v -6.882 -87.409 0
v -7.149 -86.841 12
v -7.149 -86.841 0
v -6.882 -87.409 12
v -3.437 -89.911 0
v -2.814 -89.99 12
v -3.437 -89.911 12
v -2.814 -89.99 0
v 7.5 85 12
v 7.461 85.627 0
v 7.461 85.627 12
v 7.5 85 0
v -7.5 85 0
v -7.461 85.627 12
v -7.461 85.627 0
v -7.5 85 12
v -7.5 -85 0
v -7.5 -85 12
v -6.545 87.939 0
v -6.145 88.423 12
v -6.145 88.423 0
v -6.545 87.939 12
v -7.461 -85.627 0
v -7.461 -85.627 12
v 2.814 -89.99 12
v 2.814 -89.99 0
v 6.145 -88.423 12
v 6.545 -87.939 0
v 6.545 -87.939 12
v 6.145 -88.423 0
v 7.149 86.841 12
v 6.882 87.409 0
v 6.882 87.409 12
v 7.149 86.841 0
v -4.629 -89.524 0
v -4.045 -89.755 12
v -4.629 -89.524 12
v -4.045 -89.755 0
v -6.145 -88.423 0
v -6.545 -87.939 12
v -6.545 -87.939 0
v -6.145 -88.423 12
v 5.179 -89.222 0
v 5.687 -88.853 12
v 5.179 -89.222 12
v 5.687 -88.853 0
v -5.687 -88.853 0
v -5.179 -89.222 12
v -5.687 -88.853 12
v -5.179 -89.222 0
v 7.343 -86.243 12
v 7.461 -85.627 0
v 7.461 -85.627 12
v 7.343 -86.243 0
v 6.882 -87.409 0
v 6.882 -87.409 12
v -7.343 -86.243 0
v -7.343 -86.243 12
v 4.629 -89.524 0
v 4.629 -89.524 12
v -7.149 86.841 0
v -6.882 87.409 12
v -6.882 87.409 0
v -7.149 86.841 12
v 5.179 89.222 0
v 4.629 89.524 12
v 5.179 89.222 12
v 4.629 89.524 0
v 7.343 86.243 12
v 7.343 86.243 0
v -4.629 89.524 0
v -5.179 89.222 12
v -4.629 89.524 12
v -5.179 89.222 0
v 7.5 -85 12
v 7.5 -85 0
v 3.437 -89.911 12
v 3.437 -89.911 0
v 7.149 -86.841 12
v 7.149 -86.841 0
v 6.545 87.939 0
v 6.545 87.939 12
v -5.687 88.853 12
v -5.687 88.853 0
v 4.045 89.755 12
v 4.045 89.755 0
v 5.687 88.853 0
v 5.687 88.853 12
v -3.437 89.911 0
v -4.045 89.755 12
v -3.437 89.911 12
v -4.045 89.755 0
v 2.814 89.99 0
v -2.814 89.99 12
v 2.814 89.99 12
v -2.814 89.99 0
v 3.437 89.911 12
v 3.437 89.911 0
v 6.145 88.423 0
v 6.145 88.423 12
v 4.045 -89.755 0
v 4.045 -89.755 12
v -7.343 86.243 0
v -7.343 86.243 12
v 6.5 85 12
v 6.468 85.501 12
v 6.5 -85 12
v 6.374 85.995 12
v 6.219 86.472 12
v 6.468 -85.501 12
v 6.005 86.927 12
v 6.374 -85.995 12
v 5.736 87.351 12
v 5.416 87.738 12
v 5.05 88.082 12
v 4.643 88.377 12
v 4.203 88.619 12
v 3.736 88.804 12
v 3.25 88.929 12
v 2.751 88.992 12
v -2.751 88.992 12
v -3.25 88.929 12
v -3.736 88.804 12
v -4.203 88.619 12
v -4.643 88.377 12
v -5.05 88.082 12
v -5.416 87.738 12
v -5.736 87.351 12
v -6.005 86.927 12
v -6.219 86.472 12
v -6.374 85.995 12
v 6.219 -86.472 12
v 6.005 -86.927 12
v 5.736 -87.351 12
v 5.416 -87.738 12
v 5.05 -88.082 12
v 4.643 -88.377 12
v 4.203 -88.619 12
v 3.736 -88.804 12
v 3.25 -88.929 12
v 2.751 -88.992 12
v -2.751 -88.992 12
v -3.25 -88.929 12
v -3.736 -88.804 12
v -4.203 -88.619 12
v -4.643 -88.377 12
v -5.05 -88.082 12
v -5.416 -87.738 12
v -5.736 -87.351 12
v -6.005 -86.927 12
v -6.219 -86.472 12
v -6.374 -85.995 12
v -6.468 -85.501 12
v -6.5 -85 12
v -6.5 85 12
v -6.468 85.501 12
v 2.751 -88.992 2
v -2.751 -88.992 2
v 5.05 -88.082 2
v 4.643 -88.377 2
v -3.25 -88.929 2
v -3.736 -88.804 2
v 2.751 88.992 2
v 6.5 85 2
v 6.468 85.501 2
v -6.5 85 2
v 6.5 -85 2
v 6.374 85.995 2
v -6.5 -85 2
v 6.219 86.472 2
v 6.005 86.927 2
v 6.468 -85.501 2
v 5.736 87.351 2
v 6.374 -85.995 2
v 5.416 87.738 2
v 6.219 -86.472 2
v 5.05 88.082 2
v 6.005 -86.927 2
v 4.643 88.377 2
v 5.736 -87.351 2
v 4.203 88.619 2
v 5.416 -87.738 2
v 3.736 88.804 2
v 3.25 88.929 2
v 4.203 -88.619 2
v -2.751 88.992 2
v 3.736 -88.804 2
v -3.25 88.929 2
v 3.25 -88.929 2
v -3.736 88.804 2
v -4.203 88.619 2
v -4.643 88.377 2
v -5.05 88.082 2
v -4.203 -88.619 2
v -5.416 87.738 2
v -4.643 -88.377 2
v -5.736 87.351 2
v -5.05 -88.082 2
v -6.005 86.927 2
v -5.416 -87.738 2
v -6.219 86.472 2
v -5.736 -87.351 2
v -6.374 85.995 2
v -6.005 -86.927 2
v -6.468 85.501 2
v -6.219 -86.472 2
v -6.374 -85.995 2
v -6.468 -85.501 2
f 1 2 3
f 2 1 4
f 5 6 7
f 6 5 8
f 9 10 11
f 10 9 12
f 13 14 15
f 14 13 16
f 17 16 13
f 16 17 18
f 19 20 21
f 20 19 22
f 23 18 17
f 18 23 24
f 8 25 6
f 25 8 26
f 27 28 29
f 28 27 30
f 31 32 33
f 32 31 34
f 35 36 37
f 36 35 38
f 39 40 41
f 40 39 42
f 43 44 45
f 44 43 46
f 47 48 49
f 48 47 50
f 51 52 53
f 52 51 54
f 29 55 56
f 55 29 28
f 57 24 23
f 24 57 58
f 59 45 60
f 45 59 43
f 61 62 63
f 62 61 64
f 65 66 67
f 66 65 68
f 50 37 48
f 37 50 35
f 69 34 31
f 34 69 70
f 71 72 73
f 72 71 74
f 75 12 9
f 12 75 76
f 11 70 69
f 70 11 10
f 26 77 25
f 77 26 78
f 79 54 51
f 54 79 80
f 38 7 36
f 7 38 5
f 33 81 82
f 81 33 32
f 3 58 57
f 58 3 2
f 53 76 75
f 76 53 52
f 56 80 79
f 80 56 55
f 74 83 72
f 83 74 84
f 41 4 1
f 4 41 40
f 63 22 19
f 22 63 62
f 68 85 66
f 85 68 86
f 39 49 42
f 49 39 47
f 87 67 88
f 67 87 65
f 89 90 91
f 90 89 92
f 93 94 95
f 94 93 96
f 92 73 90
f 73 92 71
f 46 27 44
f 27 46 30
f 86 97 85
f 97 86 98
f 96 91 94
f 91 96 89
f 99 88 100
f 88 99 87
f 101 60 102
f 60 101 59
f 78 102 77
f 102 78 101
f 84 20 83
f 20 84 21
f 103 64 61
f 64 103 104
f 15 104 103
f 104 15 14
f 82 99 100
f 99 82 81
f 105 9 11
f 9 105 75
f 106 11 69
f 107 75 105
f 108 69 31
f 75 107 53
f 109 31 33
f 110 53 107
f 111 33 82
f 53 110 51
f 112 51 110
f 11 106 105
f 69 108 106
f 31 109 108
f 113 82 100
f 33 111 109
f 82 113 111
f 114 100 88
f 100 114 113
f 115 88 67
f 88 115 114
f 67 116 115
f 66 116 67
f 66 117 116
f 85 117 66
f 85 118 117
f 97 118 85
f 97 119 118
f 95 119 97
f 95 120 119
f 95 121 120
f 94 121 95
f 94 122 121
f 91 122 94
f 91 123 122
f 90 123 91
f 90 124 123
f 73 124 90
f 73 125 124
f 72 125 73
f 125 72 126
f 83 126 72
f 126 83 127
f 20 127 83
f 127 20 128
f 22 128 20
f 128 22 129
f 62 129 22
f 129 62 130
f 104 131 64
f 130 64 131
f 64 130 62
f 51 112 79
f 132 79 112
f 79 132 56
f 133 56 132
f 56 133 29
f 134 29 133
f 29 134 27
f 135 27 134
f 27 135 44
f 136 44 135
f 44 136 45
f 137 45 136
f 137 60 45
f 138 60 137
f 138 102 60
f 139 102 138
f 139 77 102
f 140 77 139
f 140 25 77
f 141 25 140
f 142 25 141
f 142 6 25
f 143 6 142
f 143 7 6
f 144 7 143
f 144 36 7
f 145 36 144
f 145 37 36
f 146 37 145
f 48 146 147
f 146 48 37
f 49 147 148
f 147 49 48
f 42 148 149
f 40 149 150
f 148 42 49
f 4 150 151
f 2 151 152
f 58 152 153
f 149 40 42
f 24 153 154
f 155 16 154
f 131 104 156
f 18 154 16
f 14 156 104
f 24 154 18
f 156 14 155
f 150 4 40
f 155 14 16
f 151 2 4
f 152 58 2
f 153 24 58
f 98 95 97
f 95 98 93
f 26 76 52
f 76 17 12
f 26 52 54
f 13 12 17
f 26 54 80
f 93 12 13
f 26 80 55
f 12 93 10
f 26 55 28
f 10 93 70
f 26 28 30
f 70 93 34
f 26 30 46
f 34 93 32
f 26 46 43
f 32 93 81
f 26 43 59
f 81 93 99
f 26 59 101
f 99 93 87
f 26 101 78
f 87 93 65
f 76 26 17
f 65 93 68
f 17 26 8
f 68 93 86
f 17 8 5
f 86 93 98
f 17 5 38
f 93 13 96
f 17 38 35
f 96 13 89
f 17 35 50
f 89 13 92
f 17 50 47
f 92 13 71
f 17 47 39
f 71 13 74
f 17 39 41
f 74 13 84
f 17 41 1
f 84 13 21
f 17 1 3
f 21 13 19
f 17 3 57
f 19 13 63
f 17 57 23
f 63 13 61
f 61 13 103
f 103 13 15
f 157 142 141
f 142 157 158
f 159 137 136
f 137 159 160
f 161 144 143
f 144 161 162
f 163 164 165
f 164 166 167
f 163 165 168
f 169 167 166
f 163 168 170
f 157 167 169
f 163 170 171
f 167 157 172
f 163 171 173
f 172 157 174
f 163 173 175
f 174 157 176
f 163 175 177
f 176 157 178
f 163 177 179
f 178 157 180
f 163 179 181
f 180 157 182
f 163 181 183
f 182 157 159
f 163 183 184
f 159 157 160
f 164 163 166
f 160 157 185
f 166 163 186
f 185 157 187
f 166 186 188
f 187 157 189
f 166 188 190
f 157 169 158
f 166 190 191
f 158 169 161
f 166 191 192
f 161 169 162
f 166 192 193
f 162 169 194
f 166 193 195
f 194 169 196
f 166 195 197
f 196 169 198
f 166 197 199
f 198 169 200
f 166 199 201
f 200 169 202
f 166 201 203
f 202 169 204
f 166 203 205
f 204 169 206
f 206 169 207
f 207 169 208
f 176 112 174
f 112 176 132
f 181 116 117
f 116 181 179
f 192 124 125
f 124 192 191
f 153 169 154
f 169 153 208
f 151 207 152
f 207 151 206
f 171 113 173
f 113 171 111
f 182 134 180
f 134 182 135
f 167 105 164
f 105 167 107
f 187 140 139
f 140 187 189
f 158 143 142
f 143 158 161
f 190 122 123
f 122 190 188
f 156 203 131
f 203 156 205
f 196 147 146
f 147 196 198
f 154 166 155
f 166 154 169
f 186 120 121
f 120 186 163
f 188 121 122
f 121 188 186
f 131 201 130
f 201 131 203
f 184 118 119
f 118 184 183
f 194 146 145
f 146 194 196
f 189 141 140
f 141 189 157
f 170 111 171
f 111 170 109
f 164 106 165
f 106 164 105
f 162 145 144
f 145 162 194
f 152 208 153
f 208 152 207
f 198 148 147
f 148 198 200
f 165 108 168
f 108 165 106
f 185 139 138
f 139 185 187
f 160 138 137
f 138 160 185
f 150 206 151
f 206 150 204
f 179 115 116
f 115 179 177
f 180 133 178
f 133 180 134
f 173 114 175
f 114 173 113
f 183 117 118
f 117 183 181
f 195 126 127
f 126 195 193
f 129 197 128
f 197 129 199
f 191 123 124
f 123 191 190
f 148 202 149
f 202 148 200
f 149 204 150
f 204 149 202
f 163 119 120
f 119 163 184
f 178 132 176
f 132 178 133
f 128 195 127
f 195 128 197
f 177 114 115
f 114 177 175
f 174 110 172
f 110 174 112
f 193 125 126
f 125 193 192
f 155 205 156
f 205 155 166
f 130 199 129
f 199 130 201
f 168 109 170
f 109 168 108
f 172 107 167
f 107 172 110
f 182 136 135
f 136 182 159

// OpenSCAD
$fn = 50;


difference() {
	union() {
		hull() {
			translate(v = [-2.5000000000, 85.0000000000, 0]) {
				cylinder(h = 12, r = 5);
			}
			translate(v = [2.5000000000, 85.0000000000, 0]) {
				cylinder(h = 12, r = 5);
			}
			translate(v = [-2.5000000000, -85.0000000000, 0]) {
				cylinder(h = 12, r = 5);
			}
			translate(v = [2.5000000000, -85.0000000000, 0]) {
				cylinder(h = 12, r = 5);
			}
		}
	}
	union() {
		translate(v = [0, 0, 2]) {
			hull() {
				translate(v = [-2.5000000000, 85.0000000000, 0]) {
					cylinder(h = 10, r = 4);
				}
				translate(v = [2.5000000000, 85.0000000000, 0]) {
					cylinder(h = 10, r = 4);
				}
				translate(v = [-2.5000000000, -85.0000000000, 0]) {
					cylinder(h = 10, r = 4);
				}
				translate(v = [2.5000000000, -85.0000000000, 0]) {
					cylinder(h = 10, r = 4);
				}
			}
		}
	}
}
